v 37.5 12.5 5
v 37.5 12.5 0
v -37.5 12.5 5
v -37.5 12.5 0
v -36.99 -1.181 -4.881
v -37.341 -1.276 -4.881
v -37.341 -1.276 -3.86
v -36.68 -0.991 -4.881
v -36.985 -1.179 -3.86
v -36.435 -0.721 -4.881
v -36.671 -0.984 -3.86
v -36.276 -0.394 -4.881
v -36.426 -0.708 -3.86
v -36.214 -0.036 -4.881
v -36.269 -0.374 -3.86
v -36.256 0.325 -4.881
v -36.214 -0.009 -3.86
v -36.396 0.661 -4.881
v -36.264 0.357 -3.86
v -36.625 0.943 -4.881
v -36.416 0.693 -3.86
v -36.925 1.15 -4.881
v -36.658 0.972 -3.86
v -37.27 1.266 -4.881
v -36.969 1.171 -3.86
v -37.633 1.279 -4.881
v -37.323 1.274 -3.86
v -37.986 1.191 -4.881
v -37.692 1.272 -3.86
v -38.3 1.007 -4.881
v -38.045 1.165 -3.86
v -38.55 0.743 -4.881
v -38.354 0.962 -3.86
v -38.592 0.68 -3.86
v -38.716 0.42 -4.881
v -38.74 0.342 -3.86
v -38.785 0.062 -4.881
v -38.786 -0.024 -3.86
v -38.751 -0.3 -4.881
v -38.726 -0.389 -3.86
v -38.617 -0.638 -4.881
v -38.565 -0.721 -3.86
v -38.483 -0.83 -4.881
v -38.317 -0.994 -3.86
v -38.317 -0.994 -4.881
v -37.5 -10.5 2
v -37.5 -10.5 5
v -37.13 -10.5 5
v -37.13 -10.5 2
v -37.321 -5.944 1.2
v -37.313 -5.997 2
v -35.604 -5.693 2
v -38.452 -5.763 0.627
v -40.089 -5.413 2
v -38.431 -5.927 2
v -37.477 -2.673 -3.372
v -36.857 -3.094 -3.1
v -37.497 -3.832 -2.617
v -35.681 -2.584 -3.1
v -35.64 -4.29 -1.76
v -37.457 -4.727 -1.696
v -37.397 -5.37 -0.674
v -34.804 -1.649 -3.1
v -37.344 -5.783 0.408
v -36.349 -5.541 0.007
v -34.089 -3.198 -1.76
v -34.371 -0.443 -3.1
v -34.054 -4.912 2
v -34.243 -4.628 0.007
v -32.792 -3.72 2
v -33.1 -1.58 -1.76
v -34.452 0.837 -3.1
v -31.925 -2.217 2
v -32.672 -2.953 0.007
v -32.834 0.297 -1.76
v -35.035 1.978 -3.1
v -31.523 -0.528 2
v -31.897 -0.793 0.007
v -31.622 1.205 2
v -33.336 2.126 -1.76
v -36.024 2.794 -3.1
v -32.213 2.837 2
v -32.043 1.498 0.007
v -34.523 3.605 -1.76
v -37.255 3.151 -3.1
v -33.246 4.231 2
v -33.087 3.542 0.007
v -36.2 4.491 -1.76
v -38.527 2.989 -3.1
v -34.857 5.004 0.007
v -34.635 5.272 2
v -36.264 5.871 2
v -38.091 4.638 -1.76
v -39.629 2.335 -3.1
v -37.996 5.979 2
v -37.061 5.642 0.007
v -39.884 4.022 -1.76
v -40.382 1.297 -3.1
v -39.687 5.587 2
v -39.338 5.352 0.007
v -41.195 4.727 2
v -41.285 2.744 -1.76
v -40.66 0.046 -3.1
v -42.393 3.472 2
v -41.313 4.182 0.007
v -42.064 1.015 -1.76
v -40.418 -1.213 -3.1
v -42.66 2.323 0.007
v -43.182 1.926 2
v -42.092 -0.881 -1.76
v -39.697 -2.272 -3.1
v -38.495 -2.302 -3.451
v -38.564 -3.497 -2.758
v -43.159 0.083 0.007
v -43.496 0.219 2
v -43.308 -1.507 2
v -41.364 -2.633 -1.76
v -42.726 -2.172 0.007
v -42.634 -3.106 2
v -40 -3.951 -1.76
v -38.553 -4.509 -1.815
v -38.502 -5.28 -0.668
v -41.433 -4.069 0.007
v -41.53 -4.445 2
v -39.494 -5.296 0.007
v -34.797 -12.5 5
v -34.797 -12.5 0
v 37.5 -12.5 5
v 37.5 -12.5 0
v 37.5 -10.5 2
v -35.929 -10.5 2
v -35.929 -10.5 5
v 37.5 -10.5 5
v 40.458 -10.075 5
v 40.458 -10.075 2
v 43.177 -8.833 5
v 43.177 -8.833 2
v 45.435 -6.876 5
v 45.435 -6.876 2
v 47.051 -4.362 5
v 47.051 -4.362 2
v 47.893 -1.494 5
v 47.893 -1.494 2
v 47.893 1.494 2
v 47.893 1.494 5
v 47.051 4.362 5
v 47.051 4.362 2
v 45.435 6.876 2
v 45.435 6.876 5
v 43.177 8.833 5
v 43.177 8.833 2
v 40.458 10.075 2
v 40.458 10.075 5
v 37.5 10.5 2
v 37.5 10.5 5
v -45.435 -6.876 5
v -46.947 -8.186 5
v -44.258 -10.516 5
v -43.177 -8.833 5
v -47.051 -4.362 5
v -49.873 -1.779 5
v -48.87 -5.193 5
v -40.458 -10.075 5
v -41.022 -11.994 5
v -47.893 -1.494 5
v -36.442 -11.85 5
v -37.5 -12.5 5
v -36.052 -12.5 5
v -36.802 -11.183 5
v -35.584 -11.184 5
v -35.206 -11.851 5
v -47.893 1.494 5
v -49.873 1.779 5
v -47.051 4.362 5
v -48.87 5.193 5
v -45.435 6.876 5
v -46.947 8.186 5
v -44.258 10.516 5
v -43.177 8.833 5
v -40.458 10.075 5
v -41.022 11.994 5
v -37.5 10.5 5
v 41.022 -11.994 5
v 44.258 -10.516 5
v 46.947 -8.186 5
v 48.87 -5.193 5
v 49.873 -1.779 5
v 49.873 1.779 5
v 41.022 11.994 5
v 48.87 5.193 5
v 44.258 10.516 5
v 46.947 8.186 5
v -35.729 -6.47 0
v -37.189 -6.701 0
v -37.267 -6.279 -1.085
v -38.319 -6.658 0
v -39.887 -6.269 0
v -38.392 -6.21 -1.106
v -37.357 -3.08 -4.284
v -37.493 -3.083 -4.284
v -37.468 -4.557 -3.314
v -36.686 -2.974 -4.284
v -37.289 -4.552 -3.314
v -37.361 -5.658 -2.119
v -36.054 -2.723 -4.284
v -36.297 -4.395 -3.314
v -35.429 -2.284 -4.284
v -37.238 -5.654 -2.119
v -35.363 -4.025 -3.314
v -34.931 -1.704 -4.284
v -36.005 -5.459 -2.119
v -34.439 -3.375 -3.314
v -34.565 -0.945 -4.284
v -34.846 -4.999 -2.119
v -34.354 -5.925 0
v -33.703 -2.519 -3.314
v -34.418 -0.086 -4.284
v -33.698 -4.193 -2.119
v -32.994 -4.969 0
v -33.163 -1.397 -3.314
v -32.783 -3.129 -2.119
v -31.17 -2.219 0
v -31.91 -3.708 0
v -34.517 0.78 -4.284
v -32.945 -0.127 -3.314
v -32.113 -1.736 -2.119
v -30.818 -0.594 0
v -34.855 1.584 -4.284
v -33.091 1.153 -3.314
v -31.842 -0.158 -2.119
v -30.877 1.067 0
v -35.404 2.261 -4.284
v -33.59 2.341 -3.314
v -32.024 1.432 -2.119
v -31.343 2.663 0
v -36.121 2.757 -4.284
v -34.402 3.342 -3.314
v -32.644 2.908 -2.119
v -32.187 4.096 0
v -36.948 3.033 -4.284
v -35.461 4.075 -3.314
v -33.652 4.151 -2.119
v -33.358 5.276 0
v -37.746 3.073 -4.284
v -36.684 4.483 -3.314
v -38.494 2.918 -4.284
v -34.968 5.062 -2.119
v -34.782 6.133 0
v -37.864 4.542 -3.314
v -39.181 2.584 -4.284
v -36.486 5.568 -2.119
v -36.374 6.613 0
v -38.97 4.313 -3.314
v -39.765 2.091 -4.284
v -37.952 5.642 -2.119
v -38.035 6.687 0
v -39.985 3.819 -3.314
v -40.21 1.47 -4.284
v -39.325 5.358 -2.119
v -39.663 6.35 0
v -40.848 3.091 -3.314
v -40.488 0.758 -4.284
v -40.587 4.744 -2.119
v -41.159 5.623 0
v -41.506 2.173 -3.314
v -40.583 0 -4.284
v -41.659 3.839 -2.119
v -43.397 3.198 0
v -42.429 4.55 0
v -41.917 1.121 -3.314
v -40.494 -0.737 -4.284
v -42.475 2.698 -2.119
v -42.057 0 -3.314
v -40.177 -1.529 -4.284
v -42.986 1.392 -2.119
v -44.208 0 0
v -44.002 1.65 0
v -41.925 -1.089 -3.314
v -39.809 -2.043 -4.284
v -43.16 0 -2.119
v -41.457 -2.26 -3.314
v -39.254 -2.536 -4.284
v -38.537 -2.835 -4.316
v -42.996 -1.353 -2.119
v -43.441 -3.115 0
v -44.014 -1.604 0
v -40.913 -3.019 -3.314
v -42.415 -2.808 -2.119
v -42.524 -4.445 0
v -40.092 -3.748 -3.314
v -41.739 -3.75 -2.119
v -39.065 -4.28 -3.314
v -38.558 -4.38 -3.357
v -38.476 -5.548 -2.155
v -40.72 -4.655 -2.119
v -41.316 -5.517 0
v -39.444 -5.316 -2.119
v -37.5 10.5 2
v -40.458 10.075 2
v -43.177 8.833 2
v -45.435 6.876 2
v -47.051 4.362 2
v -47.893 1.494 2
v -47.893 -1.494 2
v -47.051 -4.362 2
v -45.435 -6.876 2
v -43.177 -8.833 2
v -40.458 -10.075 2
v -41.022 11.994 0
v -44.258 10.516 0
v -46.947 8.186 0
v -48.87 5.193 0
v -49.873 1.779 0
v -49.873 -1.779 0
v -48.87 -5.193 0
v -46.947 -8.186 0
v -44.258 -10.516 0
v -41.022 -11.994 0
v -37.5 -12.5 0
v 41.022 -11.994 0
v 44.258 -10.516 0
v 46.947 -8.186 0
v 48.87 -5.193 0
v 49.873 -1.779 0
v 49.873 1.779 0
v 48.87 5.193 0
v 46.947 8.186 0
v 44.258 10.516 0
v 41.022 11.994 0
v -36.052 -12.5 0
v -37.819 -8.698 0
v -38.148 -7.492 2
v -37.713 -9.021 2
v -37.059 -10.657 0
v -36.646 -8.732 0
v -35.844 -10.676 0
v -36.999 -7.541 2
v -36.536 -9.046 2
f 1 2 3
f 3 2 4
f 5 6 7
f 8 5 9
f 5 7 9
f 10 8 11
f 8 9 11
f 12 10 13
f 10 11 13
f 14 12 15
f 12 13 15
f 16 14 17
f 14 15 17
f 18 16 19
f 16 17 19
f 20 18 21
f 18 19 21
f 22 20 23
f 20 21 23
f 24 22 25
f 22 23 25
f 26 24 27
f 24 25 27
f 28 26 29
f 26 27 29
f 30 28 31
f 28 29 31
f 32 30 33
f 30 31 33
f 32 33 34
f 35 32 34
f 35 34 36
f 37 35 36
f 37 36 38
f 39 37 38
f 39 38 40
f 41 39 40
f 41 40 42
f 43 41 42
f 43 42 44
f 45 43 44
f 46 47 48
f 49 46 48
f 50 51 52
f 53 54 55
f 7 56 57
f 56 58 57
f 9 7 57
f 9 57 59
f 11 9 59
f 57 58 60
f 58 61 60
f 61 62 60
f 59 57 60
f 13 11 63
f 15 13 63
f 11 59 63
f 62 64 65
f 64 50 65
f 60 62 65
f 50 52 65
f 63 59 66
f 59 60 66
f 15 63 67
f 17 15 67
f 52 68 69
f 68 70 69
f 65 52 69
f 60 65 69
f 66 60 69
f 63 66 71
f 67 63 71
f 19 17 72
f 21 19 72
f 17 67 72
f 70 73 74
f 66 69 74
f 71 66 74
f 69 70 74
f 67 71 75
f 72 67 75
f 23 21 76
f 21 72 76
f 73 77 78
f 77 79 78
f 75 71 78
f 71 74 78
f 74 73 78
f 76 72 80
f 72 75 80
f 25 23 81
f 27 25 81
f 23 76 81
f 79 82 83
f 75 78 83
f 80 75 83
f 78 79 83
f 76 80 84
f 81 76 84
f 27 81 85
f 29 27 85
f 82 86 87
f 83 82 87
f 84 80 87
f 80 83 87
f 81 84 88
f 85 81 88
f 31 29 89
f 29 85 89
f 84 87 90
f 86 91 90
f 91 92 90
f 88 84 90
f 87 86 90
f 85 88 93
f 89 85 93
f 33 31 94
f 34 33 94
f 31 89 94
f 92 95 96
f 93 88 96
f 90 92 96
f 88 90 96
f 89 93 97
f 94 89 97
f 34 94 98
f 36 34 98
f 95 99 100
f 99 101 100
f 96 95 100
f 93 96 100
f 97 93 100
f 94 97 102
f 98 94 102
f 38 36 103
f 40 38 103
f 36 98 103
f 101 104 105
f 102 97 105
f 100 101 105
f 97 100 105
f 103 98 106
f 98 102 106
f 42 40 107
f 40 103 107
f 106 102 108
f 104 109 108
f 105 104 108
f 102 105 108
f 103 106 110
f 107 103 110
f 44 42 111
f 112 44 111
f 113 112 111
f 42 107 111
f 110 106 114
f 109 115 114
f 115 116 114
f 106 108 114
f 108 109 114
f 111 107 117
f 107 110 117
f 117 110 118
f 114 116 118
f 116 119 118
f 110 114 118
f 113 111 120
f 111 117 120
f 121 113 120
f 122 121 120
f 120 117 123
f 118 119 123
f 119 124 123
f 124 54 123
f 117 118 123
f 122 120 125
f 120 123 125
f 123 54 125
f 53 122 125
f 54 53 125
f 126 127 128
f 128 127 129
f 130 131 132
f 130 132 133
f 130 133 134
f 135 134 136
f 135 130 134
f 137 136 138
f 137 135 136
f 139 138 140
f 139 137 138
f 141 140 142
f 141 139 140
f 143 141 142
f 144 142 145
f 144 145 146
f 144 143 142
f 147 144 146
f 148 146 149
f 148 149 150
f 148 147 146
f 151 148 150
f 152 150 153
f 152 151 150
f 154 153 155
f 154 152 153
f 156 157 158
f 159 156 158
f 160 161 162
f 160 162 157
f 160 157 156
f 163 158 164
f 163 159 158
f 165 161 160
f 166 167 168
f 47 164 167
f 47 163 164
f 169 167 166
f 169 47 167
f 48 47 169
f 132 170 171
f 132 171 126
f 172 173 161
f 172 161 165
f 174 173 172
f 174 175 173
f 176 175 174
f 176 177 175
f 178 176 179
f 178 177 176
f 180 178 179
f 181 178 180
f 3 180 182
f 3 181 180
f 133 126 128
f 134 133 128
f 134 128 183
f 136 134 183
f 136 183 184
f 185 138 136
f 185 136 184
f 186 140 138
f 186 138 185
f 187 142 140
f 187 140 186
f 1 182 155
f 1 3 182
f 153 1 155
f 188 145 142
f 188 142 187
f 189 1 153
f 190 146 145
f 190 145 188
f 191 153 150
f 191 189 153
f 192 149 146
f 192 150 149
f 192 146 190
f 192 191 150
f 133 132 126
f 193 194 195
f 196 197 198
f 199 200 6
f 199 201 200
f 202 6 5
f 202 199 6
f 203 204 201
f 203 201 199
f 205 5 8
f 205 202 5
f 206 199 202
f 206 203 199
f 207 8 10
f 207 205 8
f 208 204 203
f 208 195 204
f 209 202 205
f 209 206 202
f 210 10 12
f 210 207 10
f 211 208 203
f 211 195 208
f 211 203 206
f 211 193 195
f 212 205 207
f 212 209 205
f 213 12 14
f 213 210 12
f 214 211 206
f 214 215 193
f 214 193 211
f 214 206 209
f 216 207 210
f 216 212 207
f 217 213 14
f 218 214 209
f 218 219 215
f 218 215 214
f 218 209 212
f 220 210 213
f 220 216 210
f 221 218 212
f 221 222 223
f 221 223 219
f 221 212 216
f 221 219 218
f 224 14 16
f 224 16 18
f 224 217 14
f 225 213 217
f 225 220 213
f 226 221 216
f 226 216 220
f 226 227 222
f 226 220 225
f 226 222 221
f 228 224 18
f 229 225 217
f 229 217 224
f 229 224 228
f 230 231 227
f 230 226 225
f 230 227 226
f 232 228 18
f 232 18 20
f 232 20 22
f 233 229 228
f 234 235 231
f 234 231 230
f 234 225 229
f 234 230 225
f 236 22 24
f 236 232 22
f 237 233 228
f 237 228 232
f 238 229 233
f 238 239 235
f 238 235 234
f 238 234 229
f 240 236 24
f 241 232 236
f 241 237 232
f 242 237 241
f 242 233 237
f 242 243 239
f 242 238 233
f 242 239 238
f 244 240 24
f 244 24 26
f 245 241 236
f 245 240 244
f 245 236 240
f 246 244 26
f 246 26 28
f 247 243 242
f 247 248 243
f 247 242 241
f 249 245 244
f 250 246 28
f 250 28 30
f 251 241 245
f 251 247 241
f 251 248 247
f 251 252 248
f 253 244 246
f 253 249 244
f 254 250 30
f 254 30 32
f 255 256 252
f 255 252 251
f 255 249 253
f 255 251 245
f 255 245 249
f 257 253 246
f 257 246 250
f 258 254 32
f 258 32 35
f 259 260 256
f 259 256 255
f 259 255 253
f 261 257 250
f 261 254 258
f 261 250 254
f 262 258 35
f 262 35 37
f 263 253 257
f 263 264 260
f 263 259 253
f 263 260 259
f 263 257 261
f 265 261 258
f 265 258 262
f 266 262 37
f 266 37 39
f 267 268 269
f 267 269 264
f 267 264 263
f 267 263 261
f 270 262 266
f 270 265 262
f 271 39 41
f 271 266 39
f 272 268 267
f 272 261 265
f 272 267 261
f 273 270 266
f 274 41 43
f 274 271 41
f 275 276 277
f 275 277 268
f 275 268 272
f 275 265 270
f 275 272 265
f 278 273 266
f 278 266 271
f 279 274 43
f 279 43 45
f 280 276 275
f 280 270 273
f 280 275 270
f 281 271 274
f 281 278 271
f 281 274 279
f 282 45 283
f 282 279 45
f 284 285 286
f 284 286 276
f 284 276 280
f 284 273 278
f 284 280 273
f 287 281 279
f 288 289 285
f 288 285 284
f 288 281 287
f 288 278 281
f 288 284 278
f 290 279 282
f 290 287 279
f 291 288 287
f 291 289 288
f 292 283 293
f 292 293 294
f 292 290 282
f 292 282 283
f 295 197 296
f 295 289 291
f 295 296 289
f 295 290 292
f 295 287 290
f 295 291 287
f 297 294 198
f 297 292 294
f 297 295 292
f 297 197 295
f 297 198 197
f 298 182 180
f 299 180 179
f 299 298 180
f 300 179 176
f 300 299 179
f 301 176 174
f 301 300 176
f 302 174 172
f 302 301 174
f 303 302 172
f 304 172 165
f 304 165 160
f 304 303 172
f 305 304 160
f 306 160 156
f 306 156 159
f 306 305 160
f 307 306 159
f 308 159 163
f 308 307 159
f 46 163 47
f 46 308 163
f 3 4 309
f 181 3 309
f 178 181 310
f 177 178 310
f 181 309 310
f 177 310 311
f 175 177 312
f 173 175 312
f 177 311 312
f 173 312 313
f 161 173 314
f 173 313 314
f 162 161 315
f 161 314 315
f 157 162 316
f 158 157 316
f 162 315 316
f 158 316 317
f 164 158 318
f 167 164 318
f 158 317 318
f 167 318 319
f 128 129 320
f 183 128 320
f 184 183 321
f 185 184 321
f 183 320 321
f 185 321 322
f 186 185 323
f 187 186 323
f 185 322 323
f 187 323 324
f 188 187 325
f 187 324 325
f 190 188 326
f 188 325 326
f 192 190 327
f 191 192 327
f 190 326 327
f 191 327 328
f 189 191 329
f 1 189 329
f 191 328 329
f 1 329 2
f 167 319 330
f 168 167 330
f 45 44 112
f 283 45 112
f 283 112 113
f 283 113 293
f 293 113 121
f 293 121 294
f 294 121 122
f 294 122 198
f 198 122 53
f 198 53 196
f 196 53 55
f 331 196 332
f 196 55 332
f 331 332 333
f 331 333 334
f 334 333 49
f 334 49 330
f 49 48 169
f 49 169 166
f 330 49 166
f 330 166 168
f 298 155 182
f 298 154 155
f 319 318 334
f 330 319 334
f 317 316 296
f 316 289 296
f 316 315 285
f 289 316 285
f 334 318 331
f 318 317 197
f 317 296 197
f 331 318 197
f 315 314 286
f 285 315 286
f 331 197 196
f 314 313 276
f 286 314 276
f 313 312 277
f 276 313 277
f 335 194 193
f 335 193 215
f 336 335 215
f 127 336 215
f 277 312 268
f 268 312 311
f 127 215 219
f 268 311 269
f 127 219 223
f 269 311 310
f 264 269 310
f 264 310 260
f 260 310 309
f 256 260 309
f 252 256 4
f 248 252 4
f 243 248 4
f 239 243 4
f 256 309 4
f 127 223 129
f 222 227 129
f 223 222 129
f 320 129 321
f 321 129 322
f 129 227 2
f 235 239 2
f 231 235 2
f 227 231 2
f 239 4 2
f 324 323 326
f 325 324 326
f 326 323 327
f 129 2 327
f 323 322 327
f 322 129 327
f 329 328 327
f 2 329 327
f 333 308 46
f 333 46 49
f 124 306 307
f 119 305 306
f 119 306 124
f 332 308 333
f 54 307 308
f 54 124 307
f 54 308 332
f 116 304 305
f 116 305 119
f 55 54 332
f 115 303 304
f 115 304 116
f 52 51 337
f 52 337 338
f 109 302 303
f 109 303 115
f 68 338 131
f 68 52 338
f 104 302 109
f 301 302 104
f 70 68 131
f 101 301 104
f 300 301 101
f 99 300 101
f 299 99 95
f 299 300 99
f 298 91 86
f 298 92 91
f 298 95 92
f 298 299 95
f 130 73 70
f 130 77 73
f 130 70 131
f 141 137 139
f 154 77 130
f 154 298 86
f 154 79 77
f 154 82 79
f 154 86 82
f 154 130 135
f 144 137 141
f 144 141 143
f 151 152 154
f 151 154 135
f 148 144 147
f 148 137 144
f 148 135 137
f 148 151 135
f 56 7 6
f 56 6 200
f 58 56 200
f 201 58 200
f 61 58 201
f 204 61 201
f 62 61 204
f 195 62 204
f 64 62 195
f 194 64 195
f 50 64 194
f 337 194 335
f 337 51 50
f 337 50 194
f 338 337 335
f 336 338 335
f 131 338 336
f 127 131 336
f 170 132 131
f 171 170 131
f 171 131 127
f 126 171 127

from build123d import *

# Parameters (mm, degrees)
PAD_DEPTH       = 5
THICKNESS_T     = -2
SKETCH001_R     = 1.28632
POCKET_DEPTH    = 7.001
POCKET001_DEPTH = 9.881798


with BuildPart() as part:
    # Sketch → Pad (new body)
    with BuildSketch(Plane.XY):
        with BuildLine():
            ThreePointArc((-37.5, 12.5), (-50, 0), (-37.5, -12.5))
            Line((-37.5, -12.5), (37.5, -12.5))
            ThreePointArc((37.5, -12.5), (50, 0), (37.5, 12.5))
            Line((37.5, 12.5), (-37.5, 12.5))
        make_face()
    extrude(amount=PAD_DEPTH)

    # Thickness
    thickness_openings = [part.faces().sort_by_distance(p)[0] for p in [
        (0, 0, 5),
    ]]
    offset(amount=THICKNESS_T, openings=thickness_openings)

    # Sphere → Sphere (revolve)
    with BuildSketch(Plane(origin=(-37.5, 0, 2), x_dir=(-1, 0, 0), z_dir=(0, 1, 0))):
        with BuildLine():
            ThreePointArc((0, -7), (4.949747, -4.949747), (7, 0))
            Line((7, 0), (0, 0))
            Line((0, 0), (0, -7))
        make_face()
    revolve(axis=Axis((-37.5, 0, 2), (0, 0, 1)))

    # Sphere001 → Sphere001 (revolve, cut)
    with BuildSketch(Plane(origin=(-37.5, 0, 2), x_dir=(-1, 0, 0), z_dir=(0, 1, 0))):
        with BuildLine():
            ThreePointArc((0, -6), (6, 0), (0, 6))
            Line((0, 6), (0, -6))
        make_face()
    revolve(axis=Axis((-37.5, 0, 2), (0, 0, 1)), mode=Mode.SUBTRACT)

    # Sketch001 (on Face12 of Sphere001) → Pocket (cut, through all)
    with BuildSketch(Plane(origin=(-37.5, 0, 2), x_dir=(-1, 0, 0), z_dir=(0, 0, 1))):
        Circle(SKETCH001_R)
    extrude(amount=-POCKET_DEPTH, mode=Mode.SUBTRACT)

    # Sketch002 (on Face5 of Pocket) → Pocket001 (cut, through all)
    with BuildSketch(Plane(origin=(-37.5, 0, 5), x_dir=(-1, 0, 0), z_dir=(0, 0, 1))):
        with BuildLine():
            ThreePointArc((-0.392266, 0), (-0.858786, 8.746469), (-5.81133, 15.97078))
            Line((-5.81133, 15.97078), (-5.640447, 16.956071))
            ThreePointArc((0.607734, 0), (0.068506, 9.430537), (-5.640447, 16.956071))
            Line((-0.392266, 0), (0.607734, 0))
        make_face()
    extrude(amount=-POCKET001_DEPTH, mode=Mode.SUBTRACT)


solid = part.part
